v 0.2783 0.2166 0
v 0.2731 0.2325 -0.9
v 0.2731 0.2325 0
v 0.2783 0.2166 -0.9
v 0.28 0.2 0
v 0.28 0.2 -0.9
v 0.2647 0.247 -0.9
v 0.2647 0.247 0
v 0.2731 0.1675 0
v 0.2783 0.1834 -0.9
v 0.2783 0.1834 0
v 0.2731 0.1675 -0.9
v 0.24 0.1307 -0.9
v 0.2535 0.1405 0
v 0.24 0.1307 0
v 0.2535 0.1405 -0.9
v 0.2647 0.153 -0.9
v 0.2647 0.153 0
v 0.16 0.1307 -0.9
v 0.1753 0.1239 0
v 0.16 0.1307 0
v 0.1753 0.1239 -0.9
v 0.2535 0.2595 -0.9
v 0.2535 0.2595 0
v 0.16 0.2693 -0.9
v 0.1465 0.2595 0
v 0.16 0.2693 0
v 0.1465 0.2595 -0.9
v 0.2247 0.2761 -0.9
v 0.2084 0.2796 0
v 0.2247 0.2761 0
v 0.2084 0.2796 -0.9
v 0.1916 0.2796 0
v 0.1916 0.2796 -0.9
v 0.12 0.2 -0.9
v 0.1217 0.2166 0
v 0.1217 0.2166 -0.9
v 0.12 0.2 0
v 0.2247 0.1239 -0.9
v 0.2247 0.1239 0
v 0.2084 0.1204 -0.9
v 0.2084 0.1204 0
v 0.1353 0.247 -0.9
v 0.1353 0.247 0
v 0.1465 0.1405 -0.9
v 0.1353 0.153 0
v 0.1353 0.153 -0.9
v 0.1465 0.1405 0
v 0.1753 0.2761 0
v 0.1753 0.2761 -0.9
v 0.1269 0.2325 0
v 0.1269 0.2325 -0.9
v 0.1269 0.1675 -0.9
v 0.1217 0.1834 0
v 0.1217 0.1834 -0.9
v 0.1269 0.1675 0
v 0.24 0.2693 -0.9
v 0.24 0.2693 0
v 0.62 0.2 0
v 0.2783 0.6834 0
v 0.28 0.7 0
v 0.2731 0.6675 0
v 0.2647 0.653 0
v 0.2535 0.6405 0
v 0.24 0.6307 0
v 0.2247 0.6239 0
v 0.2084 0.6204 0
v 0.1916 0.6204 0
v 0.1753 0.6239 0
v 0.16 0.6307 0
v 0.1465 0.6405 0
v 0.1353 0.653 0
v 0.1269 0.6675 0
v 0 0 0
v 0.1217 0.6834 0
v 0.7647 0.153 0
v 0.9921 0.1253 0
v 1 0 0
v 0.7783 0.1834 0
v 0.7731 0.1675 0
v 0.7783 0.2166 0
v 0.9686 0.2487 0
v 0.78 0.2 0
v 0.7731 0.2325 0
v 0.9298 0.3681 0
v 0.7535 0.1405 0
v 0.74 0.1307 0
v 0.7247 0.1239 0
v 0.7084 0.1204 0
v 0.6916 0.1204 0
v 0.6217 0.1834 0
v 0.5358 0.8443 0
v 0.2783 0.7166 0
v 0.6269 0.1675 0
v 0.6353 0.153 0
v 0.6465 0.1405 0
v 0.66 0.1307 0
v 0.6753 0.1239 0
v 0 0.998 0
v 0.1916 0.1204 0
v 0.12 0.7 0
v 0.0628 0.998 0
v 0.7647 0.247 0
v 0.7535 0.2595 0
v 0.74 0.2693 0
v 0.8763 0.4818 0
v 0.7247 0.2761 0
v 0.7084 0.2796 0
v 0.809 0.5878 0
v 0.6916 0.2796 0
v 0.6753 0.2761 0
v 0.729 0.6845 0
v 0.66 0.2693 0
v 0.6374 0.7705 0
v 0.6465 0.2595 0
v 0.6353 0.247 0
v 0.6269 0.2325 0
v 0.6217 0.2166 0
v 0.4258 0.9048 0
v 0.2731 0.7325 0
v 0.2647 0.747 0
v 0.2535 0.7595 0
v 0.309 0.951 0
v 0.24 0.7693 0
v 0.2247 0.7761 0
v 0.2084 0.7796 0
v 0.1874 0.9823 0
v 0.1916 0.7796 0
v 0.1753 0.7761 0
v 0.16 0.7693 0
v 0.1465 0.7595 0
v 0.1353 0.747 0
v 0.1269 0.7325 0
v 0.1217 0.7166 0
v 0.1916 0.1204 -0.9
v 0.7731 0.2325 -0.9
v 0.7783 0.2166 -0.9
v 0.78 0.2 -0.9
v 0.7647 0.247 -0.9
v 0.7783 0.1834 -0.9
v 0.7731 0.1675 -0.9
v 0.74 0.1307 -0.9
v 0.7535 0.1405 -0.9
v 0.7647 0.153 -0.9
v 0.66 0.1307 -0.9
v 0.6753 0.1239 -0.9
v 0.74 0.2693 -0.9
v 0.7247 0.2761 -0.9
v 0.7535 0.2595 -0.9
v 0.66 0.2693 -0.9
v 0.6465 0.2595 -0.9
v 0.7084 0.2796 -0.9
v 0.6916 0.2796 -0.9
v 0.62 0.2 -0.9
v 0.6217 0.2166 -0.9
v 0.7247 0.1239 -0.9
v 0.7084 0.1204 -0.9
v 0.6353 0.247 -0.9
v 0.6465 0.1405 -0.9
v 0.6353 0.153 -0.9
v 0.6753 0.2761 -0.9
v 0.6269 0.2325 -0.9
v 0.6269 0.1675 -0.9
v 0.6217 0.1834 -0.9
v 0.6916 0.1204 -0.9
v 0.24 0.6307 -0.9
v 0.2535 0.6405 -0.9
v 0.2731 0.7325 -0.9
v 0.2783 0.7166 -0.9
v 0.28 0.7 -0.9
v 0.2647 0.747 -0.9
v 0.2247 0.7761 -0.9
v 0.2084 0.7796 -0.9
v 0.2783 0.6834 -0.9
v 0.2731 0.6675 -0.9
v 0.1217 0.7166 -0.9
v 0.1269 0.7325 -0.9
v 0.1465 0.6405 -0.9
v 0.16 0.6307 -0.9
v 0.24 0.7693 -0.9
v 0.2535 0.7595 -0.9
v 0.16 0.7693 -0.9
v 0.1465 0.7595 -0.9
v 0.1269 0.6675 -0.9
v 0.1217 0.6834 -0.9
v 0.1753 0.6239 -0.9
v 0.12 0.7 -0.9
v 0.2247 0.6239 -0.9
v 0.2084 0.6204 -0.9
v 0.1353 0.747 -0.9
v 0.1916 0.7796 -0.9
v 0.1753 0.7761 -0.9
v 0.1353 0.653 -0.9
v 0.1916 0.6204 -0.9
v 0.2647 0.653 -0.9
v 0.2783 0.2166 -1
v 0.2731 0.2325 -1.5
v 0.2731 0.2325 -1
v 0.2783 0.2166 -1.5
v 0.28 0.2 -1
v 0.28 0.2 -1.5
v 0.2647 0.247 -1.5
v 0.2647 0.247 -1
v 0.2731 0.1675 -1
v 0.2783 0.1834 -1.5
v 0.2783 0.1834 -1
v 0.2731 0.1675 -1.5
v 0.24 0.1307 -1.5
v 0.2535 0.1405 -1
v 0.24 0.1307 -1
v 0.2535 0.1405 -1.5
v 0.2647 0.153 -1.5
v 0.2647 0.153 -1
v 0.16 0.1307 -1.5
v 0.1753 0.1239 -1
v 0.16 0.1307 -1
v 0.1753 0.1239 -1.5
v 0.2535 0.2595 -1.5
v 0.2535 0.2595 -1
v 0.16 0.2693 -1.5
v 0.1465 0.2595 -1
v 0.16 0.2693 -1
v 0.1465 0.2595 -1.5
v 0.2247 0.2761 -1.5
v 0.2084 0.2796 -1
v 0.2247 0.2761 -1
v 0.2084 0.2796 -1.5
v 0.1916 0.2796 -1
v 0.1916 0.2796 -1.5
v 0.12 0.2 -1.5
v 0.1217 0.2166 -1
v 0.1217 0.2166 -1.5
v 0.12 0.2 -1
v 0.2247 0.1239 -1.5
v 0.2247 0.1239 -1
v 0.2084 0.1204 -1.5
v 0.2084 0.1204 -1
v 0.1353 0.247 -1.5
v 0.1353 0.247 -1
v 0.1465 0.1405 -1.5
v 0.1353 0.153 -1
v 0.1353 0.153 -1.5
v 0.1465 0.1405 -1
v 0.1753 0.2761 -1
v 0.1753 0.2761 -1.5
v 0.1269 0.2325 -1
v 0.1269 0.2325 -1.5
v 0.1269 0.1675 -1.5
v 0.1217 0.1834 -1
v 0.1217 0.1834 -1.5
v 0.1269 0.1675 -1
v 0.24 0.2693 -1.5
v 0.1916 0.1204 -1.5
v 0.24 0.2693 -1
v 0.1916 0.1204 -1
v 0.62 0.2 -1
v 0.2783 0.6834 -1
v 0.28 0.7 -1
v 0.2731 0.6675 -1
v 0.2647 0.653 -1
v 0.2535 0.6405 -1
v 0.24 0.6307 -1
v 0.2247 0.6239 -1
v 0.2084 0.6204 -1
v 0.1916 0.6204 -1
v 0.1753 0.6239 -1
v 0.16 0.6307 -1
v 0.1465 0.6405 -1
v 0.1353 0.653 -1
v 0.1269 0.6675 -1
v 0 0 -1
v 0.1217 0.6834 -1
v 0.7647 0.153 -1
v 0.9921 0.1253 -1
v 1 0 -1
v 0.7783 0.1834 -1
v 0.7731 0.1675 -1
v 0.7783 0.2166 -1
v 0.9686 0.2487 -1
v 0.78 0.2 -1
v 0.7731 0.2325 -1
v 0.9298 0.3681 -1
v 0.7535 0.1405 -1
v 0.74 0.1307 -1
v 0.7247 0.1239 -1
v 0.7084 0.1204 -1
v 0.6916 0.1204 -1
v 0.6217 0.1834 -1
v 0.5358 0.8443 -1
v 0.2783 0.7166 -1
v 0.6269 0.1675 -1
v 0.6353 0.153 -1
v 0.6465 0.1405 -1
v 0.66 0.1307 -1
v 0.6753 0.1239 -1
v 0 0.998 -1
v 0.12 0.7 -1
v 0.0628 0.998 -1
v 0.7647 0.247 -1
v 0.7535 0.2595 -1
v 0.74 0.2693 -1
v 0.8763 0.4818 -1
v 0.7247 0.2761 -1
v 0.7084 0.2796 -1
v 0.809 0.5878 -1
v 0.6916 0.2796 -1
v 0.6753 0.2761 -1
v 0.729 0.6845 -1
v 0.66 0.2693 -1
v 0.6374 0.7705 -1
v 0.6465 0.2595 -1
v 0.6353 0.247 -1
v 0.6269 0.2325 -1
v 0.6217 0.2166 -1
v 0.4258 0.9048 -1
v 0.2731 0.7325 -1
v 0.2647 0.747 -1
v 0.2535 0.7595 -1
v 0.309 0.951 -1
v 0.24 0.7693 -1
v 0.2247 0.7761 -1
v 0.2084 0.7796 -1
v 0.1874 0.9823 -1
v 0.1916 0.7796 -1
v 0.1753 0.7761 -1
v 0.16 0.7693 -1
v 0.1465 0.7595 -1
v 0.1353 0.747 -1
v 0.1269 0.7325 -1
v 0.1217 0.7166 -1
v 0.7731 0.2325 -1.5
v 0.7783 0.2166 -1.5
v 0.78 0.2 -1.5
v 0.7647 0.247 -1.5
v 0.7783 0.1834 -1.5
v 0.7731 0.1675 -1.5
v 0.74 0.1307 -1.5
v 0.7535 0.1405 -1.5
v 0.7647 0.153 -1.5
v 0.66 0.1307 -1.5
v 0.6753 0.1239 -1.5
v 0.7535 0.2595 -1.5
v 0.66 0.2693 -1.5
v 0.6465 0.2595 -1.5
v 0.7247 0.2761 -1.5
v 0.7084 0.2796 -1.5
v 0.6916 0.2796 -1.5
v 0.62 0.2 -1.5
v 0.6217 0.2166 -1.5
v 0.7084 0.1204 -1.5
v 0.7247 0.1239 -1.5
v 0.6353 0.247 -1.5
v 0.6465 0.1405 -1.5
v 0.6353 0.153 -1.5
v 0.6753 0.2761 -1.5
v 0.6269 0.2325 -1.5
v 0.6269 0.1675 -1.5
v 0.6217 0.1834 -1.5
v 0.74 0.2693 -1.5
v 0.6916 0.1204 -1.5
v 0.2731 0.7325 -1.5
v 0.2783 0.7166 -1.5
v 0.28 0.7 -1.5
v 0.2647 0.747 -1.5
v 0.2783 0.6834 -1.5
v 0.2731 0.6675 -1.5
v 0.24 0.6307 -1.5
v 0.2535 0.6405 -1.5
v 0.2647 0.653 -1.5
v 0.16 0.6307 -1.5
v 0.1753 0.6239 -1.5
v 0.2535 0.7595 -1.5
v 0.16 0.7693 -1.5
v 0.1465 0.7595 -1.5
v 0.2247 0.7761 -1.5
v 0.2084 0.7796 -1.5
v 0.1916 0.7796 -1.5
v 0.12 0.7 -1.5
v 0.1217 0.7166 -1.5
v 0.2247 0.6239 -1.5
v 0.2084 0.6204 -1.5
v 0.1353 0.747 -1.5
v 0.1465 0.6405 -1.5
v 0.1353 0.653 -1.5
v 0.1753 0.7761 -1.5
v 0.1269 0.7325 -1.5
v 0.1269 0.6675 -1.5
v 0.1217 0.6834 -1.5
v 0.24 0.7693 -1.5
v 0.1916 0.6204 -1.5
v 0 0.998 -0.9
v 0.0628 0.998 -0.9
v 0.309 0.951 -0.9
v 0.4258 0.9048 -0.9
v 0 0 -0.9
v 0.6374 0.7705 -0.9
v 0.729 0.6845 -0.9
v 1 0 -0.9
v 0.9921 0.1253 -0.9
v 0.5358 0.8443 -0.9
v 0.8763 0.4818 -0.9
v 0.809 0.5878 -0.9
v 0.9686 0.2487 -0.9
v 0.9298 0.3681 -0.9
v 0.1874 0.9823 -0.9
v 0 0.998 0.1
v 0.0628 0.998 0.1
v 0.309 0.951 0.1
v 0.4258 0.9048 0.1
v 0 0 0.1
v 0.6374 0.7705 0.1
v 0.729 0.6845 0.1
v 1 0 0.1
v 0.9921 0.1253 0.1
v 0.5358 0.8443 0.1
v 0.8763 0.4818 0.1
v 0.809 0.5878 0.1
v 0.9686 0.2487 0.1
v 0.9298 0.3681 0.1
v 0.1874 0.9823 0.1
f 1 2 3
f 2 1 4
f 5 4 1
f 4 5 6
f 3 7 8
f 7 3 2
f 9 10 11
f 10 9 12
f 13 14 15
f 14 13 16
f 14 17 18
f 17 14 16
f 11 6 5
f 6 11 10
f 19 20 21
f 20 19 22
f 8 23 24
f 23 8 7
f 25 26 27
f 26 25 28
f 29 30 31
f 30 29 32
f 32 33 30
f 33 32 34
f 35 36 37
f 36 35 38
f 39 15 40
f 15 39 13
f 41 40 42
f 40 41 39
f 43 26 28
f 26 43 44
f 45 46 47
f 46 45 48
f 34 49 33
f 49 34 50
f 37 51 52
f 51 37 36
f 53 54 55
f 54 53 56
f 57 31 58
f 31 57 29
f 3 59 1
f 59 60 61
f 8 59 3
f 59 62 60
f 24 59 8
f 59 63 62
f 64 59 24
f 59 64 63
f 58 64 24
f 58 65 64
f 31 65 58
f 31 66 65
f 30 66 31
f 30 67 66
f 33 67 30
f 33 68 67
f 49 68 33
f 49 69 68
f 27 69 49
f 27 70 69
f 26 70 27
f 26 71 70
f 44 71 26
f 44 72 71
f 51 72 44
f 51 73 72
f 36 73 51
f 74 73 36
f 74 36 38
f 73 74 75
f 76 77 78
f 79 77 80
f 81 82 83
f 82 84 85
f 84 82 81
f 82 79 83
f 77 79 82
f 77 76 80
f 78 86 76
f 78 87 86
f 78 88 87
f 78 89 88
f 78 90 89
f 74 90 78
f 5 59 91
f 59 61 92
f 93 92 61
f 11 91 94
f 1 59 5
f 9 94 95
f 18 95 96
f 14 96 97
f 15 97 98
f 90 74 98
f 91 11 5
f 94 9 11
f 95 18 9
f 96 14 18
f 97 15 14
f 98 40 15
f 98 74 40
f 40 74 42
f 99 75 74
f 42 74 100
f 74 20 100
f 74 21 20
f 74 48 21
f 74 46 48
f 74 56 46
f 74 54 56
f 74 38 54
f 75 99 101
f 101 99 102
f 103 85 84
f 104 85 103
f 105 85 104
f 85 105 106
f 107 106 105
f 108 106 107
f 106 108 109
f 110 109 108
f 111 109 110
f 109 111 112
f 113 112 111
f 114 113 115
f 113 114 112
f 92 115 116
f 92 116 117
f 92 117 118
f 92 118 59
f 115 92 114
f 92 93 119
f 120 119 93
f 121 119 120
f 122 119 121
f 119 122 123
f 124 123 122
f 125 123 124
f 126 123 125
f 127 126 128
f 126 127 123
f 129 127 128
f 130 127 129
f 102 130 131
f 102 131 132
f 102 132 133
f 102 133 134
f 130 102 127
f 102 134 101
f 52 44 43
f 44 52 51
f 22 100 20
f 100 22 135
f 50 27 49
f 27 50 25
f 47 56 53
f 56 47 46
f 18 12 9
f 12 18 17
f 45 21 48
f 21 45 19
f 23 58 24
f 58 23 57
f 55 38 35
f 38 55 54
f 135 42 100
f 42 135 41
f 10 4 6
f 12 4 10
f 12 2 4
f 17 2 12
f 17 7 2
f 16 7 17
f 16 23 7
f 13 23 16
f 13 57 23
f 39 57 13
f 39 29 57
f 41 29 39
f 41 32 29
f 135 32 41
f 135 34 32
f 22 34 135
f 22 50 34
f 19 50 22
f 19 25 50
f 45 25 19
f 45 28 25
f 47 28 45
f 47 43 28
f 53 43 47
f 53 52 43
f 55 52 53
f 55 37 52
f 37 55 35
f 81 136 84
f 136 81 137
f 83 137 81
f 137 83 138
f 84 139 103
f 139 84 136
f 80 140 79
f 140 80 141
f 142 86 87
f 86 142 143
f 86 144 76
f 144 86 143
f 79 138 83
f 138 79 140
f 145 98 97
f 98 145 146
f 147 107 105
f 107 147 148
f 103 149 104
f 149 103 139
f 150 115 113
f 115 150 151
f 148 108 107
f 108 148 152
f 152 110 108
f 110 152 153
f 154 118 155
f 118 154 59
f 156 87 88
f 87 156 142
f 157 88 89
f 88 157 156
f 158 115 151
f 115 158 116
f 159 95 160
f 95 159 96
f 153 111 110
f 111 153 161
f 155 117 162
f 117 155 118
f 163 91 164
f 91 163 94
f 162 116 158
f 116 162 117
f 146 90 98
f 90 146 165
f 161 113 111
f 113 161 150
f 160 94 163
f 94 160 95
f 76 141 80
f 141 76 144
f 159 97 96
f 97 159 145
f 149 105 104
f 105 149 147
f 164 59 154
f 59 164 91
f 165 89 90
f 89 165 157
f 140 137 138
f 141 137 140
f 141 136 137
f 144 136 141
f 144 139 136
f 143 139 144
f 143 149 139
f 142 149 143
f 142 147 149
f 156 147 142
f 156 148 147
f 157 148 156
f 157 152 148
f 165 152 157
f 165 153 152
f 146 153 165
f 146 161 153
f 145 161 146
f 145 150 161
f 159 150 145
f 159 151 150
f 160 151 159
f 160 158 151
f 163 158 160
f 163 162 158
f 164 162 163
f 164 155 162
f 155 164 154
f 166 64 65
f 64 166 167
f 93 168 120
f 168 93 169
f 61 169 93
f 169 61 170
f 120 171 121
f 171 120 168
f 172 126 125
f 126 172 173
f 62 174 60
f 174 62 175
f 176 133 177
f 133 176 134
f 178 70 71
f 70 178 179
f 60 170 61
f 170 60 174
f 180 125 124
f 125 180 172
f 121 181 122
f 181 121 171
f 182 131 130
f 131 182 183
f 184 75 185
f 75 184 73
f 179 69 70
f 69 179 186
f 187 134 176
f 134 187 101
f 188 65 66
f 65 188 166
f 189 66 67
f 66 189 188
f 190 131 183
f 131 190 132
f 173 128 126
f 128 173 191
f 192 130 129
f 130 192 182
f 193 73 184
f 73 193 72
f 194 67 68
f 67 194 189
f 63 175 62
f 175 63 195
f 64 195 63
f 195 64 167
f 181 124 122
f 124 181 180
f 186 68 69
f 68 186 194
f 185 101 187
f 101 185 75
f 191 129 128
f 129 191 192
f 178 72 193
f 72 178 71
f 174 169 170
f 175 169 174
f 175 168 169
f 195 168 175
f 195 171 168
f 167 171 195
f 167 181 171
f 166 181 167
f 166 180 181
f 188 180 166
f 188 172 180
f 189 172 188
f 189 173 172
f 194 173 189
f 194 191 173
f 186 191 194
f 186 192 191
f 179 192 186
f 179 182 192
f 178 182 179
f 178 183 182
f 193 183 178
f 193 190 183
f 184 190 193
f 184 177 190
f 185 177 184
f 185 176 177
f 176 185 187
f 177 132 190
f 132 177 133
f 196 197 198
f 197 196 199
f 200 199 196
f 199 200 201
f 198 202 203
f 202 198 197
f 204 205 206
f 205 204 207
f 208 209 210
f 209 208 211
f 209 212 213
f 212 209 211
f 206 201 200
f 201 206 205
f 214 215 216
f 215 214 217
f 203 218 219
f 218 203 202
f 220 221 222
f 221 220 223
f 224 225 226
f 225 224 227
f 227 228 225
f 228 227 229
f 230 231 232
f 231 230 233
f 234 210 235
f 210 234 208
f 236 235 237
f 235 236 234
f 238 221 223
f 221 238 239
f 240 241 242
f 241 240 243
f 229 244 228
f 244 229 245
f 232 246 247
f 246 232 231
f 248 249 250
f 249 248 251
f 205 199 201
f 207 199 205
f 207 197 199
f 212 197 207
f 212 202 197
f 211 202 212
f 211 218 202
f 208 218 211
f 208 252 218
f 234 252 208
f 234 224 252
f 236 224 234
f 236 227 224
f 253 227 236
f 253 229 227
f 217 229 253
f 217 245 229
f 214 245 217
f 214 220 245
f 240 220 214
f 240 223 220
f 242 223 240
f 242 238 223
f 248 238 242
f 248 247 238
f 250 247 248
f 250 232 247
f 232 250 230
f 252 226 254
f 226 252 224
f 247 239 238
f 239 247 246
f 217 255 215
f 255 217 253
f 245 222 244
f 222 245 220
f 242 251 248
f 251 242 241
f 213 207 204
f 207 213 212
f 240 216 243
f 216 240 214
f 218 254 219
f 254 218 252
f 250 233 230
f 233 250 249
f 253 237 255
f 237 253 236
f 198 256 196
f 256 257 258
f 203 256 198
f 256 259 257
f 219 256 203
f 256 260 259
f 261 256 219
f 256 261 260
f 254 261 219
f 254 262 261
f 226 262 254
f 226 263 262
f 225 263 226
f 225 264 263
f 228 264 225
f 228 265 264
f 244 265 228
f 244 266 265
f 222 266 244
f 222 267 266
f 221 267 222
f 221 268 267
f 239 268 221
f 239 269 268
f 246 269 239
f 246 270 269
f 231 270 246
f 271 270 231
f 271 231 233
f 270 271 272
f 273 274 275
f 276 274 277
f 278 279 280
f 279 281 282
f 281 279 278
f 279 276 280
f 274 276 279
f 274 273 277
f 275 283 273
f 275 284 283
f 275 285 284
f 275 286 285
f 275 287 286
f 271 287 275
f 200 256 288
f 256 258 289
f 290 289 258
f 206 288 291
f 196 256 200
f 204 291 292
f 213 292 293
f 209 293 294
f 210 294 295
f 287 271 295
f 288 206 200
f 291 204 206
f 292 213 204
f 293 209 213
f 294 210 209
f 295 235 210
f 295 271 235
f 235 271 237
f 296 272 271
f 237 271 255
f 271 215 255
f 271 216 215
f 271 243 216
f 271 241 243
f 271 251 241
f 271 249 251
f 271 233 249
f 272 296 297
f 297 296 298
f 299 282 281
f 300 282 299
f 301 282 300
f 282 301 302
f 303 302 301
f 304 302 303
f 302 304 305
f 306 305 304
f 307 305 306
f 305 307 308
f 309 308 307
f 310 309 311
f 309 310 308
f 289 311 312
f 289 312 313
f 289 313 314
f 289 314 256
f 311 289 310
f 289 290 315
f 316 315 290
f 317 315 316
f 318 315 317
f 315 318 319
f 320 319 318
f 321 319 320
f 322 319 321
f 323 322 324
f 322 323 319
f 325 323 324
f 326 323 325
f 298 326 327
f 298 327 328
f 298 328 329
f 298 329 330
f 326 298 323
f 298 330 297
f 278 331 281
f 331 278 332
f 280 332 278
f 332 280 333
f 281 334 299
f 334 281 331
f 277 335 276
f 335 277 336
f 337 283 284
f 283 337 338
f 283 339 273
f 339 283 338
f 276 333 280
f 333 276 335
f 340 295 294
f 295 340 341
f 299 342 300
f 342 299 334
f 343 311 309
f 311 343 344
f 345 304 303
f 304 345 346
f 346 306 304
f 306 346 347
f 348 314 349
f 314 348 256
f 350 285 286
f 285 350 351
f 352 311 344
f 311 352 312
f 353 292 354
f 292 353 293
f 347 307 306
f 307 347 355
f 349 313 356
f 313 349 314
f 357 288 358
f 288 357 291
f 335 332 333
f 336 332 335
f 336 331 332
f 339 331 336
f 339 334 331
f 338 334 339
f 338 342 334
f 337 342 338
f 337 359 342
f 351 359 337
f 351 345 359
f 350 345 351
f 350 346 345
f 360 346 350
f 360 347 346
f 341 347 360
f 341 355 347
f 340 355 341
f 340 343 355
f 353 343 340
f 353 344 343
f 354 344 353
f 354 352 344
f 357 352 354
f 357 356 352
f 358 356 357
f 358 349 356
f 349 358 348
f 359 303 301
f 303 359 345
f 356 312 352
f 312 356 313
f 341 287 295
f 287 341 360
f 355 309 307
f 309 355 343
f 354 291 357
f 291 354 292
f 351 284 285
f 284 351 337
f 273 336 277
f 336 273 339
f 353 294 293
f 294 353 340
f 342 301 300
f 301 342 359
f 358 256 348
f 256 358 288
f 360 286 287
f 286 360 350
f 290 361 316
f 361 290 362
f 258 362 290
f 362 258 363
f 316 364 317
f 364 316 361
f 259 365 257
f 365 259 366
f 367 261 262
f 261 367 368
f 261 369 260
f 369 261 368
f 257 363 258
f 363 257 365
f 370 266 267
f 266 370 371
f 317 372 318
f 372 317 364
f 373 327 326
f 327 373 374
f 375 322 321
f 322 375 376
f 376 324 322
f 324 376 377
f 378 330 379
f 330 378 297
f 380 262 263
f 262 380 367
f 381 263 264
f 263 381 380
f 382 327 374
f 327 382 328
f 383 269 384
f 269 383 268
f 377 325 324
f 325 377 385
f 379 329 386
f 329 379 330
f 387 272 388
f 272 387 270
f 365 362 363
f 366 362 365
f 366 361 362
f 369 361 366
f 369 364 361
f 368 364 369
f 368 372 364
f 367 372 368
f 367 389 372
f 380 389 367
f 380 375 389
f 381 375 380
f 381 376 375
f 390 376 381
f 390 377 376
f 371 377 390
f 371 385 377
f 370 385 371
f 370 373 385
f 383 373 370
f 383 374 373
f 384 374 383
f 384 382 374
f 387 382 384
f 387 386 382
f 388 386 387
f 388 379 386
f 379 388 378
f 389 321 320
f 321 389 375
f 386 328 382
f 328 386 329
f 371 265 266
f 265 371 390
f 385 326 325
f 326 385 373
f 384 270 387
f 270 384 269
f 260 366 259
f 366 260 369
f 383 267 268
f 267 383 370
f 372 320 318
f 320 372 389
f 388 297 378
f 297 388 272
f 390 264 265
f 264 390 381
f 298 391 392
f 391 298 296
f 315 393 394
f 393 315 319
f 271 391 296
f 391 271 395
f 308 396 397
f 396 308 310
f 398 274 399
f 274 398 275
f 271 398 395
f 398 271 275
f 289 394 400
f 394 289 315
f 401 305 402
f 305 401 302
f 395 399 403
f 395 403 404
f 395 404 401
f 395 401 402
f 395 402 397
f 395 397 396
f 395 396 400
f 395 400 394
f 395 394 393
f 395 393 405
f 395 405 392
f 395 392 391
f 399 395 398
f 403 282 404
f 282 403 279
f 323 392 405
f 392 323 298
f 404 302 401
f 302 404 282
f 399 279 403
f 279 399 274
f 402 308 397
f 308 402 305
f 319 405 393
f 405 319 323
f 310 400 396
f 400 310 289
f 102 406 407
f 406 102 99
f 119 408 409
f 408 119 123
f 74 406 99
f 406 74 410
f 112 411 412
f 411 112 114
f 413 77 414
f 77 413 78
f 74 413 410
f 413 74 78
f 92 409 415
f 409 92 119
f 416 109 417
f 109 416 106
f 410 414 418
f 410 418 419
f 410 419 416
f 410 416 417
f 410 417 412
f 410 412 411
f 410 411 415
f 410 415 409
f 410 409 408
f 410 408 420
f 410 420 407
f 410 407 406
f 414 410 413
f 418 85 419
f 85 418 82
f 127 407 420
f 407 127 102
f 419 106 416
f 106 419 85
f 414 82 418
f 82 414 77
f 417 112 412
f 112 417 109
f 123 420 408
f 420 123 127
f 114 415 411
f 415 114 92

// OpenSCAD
module Table_Small_01(){

    color("#954520")
    linear_extrude(height = 0.10)

    intersection(){

    circle(1, $fn=50);

    square(1);

    }

    color("#4f200f"){
    translate([0.2,0.2,-0.9])
    cylinder(0.9,0.08,0.08, $fn =30);

    translate([0.7,0.2,-0.9])
    cylinder(0.9,0.08,0.08, $fn =30);

    translate([0.2,0.7,-0.9])
    cylinder(0.9,0.08,0.08, $fn =30);
    }

    translate([0,0,-1]){
    color("#954520")
    linear_extrude(height = 0.10)

    intersection(){

    circle(1, $fn=50);

    square(1);

    }

    color("#4f200f"){
    translate([0.2,0.2,-0.5])
    cylinder(0.5,0.08,0.08, $fn =30);

    translate([0.7,0.2,-0.5])
    cylinder(0.5,0.08,0.08, $fn =30);

    translate([0.2,0.7,-0.5])
    cylinder(0.5,0.08,0.08, $fn =30);
    }
    }

}

Table_Small_01();

// Written by Nicolì Angelo (Gengio) 2024: 
// MIT License

//Permission is hereby granted, free of charge, to any person obtaining a copy of this software and associated documentation files (the "Software"), to deal in the Software without restriction, including without limitation the rights to use, copy, modify, merge, publish, distribute, sublicense, and/or sell copies of the Software, and to permit persons to whom the Software is furnished to do so, subject to the following conditions:

//The above copyright notice and this permission notice shall be included in all copies or substantial portions of the Software.

//THE SOFTWARE IS PROVIDED "AS IS", WITHOUT WARRANTY OF ANY KIND, EXPRESS OR IMPLIED, INCLUDING BUT NOT LIMITED TO THE WARRANTIES OF MERCHANTABILITY, FITNESS FOR A PARTICULAR PURPOSE AND NONINFRINGEMENT. IN NO EVENT SHALL THE AUTHORS OR COPYRIGHT HOLDERS BE LIABLE FOR ANY CLAIM, DAMAGES OR OTHER LIABILITY, WHETHER IN AN ACTION OF CONTRACT, TORT OR OTHERWISE, ARISING FROM, OUT OF OR IN CONNECTION WITH THE SOFTWARE OR THE USE OR OTHER DEALINGS IN THE SOFTWARE.
